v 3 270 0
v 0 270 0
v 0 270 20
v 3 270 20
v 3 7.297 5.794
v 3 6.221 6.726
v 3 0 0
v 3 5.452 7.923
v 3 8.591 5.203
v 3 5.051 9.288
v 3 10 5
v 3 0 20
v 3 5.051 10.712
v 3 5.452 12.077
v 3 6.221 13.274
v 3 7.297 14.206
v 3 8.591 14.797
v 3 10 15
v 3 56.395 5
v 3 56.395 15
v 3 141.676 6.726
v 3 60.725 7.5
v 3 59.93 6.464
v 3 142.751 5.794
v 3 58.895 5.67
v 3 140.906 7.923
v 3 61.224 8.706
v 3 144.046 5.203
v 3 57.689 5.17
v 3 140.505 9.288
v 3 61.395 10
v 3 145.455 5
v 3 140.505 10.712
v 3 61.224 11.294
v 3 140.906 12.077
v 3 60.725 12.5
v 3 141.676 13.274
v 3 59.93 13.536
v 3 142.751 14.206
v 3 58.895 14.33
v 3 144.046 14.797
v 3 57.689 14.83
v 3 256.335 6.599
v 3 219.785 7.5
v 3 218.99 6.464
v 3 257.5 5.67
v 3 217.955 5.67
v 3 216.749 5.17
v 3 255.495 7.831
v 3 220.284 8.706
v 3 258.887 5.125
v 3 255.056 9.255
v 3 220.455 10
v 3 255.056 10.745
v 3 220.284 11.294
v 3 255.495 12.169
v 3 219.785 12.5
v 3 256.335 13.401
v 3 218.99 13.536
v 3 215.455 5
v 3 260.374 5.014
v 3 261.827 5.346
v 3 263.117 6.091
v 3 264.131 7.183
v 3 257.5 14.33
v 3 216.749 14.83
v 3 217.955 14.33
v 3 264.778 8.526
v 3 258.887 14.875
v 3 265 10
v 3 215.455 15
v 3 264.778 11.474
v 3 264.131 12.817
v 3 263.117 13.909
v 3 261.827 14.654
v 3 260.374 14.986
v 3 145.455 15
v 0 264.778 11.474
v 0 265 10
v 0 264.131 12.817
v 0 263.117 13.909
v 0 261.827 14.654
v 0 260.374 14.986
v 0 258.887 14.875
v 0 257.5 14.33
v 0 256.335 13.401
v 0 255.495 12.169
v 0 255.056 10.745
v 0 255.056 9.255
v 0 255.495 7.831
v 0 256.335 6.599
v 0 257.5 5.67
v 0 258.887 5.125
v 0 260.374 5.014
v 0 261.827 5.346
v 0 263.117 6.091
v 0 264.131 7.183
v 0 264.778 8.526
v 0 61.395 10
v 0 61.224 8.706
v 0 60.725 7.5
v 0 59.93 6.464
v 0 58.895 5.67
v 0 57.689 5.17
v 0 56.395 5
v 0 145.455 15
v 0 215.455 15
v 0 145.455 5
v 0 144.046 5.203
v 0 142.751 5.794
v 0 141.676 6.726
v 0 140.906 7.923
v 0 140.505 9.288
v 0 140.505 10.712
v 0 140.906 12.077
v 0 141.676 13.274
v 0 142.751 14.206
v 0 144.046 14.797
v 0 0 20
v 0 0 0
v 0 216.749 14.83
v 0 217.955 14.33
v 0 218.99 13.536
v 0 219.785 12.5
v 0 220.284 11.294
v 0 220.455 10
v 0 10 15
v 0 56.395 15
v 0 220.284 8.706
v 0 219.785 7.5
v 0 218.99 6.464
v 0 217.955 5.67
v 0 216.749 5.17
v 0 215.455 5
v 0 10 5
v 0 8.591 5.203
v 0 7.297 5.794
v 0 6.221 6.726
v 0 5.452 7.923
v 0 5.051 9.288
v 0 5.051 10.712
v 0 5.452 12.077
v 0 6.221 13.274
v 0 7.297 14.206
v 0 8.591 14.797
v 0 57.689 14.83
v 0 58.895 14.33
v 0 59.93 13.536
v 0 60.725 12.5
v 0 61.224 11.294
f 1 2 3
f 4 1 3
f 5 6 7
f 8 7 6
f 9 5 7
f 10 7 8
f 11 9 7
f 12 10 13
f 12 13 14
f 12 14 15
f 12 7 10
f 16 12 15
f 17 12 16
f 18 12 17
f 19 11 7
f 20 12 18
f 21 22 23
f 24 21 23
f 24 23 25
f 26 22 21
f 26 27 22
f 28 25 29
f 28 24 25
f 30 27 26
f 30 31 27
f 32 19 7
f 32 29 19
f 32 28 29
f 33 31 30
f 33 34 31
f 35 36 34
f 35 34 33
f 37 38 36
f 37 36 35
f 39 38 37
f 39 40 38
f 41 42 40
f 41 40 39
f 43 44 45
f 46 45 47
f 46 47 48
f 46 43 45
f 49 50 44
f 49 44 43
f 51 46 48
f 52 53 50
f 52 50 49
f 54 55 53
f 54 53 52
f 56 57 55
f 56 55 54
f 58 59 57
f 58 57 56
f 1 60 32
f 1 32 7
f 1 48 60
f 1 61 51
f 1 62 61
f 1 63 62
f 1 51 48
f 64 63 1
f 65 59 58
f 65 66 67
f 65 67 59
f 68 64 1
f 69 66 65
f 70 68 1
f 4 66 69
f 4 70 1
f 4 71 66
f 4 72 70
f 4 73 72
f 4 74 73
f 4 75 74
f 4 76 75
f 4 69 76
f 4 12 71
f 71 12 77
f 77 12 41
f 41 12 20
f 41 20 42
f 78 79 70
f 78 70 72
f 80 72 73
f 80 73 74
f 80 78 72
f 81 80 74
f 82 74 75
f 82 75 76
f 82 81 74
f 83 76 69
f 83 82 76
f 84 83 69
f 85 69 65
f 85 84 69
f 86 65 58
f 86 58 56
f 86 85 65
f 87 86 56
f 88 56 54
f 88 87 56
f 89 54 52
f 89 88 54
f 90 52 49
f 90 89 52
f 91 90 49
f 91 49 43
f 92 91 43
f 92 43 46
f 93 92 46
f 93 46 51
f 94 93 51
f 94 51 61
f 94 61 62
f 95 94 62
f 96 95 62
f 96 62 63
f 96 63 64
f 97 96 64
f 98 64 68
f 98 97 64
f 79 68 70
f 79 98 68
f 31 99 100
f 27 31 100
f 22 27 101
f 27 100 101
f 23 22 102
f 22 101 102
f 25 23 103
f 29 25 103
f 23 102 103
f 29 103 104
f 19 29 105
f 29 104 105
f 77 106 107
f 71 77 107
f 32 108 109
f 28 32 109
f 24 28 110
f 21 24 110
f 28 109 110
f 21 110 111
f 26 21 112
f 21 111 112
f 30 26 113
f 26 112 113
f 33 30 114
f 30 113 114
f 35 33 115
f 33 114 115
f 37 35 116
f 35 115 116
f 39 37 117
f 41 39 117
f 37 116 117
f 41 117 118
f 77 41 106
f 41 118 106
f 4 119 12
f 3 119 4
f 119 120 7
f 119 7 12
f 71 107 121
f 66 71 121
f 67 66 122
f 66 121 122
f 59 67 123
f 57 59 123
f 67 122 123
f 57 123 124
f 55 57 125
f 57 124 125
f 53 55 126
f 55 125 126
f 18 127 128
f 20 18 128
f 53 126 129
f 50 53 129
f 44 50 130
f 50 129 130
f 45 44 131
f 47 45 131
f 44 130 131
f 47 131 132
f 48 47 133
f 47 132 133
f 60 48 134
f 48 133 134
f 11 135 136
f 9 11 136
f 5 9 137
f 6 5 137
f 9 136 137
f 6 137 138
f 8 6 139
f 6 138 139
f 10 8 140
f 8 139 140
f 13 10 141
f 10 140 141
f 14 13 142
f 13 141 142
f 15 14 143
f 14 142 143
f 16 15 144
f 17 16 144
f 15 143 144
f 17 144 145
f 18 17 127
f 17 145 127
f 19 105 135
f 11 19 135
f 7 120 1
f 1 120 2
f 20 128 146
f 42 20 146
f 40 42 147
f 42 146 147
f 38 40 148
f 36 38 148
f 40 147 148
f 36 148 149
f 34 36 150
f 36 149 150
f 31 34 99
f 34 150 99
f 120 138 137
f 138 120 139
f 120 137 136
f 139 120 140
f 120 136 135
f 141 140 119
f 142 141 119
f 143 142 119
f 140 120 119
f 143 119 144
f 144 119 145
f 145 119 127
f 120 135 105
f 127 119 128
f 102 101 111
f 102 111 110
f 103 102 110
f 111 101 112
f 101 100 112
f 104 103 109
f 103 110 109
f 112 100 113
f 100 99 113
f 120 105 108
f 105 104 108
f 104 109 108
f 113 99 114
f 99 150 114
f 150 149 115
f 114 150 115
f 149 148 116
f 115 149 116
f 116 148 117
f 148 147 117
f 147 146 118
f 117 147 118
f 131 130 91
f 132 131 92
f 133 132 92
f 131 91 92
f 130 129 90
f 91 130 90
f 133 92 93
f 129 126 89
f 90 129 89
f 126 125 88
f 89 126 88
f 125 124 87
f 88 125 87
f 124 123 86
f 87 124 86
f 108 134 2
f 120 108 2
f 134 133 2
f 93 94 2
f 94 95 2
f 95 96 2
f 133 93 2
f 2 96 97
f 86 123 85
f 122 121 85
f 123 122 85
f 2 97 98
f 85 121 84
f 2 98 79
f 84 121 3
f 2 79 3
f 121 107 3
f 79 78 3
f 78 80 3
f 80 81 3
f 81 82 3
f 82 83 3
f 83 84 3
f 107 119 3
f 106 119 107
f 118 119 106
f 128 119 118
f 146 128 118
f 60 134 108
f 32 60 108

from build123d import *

# Parameters (mm, degrees)
F0_W     = 270
F0_H     = 20
F0_R     = 5
F1_DEPTH = 3


with BuildPart() as f1:
    # F0 (on Right) → F1 (new body)
    with BuildSketch(Plane.YZ):
        with Locations((135, 10)):
            Rectangle(F0_W, F0_H)
        with BuildLine():
            ThreePointArc((10, 5), (5, 10), (10, 15))
            Line((10, 15), (56.39484, 15))
            ThreePointArc((56.39484, 15), (59.930374, 13.535534), (61.39484, 10))
            ThreePointArc((61.39484, 10), (59.930374, 6.464466), (56.39484, 5))
            Line((56.39484, 5), (10, 5))
        make_face(mode=Mode.SUBTRACT)
        with BuildLine():
            ThreePointArc((145.45455, 5), (140.45455, 10), (145.45455, 15))
            Line((145.45455, 15), (215.45455, 15))
            ThreePointArc((215.45455, 15), (218.990084, 13.535534), (220.45455, 10))
            ThreePointArc((220.45455, 10), (218.990084, 6.464466), (215.45455, 5))
            Line((215.45455, 5), (145.45455, 5))
        make_face(mode=Mode.SUBTRACT)
        with Locations((260, 10)):
            Circle(F0_R, mode=Mode.SUBTRACT)
    extrude(amount=F1_DEPTH)


solid = f1.part
